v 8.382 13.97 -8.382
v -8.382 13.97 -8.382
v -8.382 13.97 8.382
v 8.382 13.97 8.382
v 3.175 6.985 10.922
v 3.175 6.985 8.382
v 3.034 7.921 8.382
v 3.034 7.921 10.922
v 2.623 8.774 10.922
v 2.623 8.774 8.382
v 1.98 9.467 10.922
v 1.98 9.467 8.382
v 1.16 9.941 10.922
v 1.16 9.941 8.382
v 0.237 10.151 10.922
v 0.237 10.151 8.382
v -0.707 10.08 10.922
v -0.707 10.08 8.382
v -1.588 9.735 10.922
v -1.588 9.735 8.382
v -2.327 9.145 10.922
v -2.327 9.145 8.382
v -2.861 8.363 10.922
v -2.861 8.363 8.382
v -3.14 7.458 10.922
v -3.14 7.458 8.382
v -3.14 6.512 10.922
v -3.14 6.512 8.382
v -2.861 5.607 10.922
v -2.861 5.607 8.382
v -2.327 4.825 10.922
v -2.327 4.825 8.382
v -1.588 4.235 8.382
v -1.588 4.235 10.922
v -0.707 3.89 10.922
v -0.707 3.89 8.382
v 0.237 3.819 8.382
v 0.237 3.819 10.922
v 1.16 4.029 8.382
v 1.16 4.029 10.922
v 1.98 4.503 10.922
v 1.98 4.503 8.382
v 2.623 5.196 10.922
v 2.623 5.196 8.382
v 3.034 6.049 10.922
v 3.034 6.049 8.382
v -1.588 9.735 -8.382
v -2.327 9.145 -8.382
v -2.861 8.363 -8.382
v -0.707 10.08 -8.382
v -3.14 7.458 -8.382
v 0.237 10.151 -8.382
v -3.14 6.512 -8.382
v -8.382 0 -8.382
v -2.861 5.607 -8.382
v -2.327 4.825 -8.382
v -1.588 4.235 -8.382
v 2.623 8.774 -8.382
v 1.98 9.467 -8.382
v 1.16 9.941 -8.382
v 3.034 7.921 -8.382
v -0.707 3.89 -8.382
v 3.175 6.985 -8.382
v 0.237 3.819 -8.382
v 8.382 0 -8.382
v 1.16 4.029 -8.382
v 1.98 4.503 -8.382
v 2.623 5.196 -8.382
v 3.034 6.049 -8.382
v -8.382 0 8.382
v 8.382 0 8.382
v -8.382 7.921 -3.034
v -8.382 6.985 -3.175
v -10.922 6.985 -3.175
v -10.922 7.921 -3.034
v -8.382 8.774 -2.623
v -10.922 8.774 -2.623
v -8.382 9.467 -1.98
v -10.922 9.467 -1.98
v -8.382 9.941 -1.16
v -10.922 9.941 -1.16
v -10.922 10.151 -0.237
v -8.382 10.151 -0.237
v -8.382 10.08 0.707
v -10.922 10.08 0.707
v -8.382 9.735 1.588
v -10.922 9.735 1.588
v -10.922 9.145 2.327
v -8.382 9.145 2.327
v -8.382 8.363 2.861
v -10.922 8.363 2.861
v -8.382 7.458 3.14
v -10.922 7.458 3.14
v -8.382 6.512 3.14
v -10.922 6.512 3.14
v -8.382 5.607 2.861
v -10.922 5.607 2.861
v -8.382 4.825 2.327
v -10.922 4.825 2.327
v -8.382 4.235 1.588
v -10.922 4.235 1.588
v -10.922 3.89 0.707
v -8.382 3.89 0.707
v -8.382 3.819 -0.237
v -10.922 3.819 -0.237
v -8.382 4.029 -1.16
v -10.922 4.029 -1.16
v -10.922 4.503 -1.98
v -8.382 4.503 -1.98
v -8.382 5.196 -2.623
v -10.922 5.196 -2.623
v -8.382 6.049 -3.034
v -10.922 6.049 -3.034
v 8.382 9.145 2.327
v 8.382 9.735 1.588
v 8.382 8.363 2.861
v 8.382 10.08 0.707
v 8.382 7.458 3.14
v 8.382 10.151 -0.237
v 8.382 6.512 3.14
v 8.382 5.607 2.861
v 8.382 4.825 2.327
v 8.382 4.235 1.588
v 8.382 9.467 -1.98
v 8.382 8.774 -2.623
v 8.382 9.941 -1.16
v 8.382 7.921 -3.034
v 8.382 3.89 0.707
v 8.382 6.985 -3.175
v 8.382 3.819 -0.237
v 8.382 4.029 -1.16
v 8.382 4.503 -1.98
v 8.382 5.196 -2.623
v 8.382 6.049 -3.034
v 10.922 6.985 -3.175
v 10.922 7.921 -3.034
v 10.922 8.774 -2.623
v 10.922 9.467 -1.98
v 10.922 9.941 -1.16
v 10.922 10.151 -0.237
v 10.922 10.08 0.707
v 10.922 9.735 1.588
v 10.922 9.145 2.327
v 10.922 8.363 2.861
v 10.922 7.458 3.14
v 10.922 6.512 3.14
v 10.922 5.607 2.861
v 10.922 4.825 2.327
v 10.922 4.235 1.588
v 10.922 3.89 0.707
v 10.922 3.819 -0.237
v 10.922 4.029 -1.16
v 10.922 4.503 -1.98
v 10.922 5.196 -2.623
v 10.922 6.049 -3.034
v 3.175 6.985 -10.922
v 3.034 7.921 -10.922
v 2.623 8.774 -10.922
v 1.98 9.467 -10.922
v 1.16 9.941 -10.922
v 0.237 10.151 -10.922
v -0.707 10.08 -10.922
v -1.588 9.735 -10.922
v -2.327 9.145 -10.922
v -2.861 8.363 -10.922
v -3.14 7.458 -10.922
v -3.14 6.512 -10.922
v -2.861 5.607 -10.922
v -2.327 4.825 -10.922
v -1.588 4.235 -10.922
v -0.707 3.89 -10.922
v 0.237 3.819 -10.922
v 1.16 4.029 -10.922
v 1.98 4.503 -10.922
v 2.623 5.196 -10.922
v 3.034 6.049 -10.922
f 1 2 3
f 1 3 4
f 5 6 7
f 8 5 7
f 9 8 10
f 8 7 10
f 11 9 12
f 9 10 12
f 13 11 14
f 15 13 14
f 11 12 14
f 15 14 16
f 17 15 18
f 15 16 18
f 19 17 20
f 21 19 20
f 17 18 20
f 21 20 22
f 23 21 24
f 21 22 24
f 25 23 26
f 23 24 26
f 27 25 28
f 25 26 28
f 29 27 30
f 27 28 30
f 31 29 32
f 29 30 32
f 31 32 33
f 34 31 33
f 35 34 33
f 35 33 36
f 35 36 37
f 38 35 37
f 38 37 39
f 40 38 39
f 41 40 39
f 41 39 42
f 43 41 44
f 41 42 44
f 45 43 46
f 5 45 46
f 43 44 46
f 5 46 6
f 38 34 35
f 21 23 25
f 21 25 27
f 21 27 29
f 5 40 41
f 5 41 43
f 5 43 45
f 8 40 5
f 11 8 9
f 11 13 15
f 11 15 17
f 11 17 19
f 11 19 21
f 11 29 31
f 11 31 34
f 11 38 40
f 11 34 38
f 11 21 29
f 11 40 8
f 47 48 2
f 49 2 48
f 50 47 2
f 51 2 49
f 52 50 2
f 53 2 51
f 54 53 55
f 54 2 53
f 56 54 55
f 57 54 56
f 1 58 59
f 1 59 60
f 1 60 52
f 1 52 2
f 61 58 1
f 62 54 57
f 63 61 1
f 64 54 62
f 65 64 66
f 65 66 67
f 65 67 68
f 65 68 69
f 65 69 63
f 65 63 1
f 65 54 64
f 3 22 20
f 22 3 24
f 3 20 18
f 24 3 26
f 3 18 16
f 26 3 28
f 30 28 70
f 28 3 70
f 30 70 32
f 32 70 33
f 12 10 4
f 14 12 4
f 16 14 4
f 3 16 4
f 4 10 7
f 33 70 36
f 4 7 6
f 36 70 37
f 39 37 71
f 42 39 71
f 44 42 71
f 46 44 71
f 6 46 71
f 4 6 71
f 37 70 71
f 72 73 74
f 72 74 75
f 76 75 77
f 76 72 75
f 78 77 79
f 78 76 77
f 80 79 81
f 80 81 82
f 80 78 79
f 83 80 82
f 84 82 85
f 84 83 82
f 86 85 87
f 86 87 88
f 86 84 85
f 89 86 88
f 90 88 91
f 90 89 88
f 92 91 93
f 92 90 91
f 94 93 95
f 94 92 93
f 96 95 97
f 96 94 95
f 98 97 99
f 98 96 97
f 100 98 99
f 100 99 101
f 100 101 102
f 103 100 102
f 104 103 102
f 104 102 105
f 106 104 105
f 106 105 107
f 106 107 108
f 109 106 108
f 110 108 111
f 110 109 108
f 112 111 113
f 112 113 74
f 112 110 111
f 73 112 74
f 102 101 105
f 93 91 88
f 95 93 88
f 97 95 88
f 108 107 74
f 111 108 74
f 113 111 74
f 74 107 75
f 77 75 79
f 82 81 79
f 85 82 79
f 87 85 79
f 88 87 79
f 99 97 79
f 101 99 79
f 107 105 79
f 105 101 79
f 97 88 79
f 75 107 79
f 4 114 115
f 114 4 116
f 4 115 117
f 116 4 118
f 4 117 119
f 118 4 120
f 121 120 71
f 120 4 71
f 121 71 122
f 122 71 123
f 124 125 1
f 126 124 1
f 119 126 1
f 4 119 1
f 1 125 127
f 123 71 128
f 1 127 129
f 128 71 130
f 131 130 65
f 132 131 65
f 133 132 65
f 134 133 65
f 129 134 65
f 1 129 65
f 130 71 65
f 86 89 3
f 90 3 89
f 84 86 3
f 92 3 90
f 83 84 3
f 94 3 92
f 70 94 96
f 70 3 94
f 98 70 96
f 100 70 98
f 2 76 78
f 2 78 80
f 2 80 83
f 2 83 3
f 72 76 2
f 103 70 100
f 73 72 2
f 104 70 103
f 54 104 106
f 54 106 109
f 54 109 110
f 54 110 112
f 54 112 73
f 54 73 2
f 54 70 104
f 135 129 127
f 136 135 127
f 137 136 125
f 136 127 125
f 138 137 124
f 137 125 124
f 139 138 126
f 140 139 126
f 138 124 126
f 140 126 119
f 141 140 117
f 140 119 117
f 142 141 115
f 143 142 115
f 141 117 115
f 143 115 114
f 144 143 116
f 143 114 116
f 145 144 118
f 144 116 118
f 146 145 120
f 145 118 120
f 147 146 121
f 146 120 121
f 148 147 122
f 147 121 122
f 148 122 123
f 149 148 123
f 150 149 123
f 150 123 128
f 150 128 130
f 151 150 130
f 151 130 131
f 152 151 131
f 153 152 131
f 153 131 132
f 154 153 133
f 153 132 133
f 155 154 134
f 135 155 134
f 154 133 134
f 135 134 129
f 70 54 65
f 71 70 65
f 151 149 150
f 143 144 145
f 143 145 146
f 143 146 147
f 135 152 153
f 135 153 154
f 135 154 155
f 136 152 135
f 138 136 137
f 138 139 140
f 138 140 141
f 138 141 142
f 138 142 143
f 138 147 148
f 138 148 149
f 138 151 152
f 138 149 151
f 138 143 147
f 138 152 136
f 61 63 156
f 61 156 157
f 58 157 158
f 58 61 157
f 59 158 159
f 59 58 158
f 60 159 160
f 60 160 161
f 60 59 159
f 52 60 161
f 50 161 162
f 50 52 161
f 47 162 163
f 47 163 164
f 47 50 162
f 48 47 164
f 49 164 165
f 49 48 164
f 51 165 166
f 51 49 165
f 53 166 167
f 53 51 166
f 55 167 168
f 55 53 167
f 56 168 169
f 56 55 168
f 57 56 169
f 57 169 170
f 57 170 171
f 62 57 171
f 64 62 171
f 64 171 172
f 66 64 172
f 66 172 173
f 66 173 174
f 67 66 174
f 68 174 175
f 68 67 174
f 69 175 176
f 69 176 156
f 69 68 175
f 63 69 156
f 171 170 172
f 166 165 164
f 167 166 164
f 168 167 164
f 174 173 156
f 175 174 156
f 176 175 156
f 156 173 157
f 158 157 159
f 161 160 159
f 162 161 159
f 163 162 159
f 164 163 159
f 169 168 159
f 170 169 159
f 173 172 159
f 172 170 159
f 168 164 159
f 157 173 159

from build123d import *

# Parameters (mm, degrees)
SKETCH1_W           = 16.764
SKETCH1_H           = 16.764
BOSS_EXTRUDE1_DEPTH = 13.97
SKETCH2_R           = 3.175
BOSS_EXTRUDE2_DEPTH = 2.54
SKETCH3_R           = 3.175
BOSS_EXTRUDE3_DEPTH = 2.54


with BuildPart() as part:
    # Sketch1 → Boss-Extrude1 (new body)
    with BuildSketch(Plane(origin=(0, 0, 0), x_dir=(1, 0, 0), z_dir=(0, 1, 0))):
        Rectangle(SKETCH1_W, SKETCH1_H)
    extrude(amount=BOSS_EXTRUDE1_DEPTH)

    # Sketch2 → Boss-Extrude2 (add)
    with BuildSketch(Plane.XY.offset(8.382)):
        with Locations((0, 6.985)):
            Circle(SKETCH2_R)
    boss_extrude2 = extrude(amount=BOSS_EXTRUDE2_DEPTH)

    # Mirror1: Boss-Extrude2 across plane
    add(boss_extrude2.mirror(Plane.XY))

    # Sketch3 → Boss-Extrude3 (add)
    with BuildSketch(Plane(origin=(8.382, 0, 0), x_dir=(0, 0, -1), z_dir=(1, 0, 0))):
        with Locations((0, 6.985)):
            Circle(SKETCH3_R)
    boss_extrude3 = extrude(amount=BOSS_EXTRUDE3_DEPTH)

    # Mirror2: Boss-Extrude3 across plane
    add(boss_extrude3.mirror(Plane(origin=(0, 0, 0), x_dir=(0, 0, 1), z_dir=(1, 0, 0))))


solid = part.part
